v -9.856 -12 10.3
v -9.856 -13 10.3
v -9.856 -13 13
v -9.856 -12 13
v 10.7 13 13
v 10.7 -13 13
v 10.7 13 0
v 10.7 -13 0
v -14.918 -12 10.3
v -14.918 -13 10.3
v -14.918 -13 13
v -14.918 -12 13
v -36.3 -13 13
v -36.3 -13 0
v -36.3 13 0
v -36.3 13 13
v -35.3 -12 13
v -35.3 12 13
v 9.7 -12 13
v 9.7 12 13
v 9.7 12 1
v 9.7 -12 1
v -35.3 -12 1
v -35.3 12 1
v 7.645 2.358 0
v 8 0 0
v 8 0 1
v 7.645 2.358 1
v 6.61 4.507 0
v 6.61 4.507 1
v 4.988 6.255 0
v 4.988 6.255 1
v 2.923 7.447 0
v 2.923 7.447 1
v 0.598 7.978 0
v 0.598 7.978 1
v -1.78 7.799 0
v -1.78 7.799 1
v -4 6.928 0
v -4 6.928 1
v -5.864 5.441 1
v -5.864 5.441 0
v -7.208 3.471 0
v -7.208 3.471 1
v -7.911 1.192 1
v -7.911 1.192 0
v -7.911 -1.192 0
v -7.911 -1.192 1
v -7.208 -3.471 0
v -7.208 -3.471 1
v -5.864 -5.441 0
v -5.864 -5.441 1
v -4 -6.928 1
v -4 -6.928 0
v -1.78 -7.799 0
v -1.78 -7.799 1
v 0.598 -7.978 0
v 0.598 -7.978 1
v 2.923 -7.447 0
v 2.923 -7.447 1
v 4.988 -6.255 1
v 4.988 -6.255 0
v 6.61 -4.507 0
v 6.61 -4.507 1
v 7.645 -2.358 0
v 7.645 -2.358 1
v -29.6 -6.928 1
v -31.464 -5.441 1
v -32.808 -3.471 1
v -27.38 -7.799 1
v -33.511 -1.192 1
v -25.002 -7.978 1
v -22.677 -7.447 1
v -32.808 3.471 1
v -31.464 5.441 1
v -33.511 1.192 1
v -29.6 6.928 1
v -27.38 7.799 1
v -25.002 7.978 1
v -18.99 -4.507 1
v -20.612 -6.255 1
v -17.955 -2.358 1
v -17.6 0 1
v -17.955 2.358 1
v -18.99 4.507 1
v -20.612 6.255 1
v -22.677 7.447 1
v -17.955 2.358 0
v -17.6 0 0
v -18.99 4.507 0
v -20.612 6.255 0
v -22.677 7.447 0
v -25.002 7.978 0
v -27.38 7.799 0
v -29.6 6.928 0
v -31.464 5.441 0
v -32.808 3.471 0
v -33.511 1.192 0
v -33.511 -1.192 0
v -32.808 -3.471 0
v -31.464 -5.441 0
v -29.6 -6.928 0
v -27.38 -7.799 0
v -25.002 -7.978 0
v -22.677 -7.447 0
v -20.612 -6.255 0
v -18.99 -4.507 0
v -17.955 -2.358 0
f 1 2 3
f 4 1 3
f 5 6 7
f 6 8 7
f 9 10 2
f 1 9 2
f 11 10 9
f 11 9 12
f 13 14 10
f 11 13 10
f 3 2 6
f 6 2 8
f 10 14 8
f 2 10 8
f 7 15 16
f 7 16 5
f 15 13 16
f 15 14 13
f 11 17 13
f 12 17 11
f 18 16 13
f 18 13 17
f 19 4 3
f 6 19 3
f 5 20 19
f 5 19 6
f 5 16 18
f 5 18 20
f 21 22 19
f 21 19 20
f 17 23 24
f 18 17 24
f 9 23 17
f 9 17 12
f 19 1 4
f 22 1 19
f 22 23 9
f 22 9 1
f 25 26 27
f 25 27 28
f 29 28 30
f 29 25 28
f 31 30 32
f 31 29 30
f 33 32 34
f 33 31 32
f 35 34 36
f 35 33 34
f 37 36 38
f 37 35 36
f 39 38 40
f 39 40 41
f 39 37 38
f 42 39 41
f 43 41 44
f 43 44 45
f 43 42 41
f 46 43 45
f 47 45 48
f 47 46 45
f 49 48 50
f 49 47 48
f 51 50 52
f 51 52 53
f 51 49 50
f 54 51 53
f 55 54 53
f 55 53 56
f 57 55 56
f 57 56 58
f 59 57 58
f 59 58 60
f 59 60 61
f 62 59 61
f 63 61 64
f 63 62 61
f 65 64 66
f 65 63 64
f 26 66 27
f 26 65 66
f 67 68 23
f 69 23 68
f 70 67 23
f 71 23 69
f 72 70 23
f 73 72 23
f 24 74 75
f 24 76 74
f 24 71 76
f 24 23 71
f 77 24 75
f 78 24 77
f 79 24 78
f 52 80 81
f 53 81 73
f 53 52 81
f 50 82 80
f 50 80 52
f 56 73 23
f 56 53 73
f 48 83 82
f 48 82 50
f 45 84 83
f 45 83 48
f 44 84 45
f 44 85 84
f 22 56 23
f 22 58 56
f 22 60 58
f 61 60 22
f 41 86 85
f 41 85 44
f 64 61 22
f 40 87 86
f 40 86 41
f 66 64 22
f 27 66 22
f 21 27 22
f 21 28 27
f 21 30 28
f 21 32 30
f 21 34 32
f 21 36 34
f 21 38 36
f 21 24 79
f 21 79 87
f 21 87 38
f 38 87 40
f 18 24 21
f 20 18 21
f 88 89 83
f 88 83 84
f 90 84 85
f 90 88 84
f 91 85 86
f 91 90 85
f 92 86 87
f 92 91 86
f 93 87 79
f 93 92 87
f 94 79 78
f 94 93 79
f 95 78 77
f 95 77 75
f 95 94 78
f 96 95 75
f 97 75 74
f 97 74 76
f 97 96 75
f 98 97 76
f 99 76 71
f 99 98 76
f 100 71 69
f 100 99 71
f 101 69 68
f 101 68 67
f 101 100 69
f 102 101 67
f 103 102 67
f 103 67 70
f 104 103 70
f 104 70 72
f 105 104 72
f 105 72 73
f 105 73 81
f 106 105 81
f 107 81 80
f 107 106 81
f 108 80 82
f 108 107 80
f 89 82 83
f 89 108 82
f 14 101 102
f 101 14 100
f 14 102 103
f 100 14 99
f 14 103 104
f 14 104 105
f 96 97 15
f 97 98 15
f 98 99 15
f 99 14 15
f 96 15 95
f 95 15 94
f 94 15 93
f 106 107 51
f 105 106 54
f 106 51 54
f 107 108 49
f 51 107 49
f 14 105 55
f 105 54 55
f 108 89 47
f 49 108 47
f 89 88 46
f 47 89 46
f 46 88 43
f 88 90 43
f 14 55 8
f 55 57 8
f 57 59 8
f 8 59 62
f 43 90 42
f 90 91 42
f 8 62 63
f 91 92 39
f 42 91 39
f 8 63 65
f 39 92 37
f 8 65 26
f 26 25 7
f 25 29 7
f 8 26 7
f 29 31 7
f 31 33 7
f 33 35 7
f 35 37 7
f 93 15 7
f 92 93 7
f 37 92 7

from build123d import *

# Parameters (mm, degrees)
SKETCH1_W           = 47
SKETCH1_H           = 26
SKETCH1_R           = 8
BOSS_EXTRUDE1_DEPTH = 1
SKETCH2_W           = 47
SKETCH2_H           = 26
SKETCH2_W_2         = 45
SKETCH2_H_2         = 24
BOSS_EXTRUDE2_DEPTH = 12
CUT_EXTRUDE1_REACH  = 48.505
SKETCH3_W           = 5.061855515
SKETCH3_H           = 3.126915658


with BuildPart() as part:
    # Sketch1 → Boss-Extrude1 (new body)
    with BuildSketch(Plane.XY):
        with Locations((-12.8, 0)):
            Rectangle(SKETCH1_W, SKETCH1_H)
        with Locations((-25.6, 0)):
            Circle(SKETCH1_R, mode=Mode.SUBTRACT)
        Circle(SKETCH1_R, mode=Mode.SUBTRACT)
    extrude(amount=BOSS_EXTRUDE1_DEPTH)

    # Sketch2 → Boss-Extrude2 (add)
    with BuildSketch(Plane.XY.offset(1)):
        with Locations((-12.8, 0)):
            Rectangle(SKETCH2_W, SKETCH2_H)
        with Locations((-12.8, 0)):
            Rectangle(SKETCH2_W_2, SKETCH2_H_2, mode=Mode.SUBTRACT)
    extrude(amount=BOSS_EXTRUDE2_DEPTH)

    # Sketch3 → Cut-Extrude1 (cut, up to next)
    with BuildSketch(Plane.XZ.offset(13), mode=Mode.PRIVATE) as cut_extrude1_sk1:
        with Locations((-12.387065936, 11.863457829)):
            Rectangle(SKETCH3_W, SKETCH3_H)
    cut_extrude1_tool1 = extrude(cut_extrude1_sk1.sketch, amount=-CUT_EXTRUDE1_REACH, mode=Mode.PRIVATE) & part.part
    add(cut_extrude1_tool1.solids().sort_by_distance((-12.387066, -13, 11.863458))[0], mode=Mode.SUBTRACT)


solid = part.part
